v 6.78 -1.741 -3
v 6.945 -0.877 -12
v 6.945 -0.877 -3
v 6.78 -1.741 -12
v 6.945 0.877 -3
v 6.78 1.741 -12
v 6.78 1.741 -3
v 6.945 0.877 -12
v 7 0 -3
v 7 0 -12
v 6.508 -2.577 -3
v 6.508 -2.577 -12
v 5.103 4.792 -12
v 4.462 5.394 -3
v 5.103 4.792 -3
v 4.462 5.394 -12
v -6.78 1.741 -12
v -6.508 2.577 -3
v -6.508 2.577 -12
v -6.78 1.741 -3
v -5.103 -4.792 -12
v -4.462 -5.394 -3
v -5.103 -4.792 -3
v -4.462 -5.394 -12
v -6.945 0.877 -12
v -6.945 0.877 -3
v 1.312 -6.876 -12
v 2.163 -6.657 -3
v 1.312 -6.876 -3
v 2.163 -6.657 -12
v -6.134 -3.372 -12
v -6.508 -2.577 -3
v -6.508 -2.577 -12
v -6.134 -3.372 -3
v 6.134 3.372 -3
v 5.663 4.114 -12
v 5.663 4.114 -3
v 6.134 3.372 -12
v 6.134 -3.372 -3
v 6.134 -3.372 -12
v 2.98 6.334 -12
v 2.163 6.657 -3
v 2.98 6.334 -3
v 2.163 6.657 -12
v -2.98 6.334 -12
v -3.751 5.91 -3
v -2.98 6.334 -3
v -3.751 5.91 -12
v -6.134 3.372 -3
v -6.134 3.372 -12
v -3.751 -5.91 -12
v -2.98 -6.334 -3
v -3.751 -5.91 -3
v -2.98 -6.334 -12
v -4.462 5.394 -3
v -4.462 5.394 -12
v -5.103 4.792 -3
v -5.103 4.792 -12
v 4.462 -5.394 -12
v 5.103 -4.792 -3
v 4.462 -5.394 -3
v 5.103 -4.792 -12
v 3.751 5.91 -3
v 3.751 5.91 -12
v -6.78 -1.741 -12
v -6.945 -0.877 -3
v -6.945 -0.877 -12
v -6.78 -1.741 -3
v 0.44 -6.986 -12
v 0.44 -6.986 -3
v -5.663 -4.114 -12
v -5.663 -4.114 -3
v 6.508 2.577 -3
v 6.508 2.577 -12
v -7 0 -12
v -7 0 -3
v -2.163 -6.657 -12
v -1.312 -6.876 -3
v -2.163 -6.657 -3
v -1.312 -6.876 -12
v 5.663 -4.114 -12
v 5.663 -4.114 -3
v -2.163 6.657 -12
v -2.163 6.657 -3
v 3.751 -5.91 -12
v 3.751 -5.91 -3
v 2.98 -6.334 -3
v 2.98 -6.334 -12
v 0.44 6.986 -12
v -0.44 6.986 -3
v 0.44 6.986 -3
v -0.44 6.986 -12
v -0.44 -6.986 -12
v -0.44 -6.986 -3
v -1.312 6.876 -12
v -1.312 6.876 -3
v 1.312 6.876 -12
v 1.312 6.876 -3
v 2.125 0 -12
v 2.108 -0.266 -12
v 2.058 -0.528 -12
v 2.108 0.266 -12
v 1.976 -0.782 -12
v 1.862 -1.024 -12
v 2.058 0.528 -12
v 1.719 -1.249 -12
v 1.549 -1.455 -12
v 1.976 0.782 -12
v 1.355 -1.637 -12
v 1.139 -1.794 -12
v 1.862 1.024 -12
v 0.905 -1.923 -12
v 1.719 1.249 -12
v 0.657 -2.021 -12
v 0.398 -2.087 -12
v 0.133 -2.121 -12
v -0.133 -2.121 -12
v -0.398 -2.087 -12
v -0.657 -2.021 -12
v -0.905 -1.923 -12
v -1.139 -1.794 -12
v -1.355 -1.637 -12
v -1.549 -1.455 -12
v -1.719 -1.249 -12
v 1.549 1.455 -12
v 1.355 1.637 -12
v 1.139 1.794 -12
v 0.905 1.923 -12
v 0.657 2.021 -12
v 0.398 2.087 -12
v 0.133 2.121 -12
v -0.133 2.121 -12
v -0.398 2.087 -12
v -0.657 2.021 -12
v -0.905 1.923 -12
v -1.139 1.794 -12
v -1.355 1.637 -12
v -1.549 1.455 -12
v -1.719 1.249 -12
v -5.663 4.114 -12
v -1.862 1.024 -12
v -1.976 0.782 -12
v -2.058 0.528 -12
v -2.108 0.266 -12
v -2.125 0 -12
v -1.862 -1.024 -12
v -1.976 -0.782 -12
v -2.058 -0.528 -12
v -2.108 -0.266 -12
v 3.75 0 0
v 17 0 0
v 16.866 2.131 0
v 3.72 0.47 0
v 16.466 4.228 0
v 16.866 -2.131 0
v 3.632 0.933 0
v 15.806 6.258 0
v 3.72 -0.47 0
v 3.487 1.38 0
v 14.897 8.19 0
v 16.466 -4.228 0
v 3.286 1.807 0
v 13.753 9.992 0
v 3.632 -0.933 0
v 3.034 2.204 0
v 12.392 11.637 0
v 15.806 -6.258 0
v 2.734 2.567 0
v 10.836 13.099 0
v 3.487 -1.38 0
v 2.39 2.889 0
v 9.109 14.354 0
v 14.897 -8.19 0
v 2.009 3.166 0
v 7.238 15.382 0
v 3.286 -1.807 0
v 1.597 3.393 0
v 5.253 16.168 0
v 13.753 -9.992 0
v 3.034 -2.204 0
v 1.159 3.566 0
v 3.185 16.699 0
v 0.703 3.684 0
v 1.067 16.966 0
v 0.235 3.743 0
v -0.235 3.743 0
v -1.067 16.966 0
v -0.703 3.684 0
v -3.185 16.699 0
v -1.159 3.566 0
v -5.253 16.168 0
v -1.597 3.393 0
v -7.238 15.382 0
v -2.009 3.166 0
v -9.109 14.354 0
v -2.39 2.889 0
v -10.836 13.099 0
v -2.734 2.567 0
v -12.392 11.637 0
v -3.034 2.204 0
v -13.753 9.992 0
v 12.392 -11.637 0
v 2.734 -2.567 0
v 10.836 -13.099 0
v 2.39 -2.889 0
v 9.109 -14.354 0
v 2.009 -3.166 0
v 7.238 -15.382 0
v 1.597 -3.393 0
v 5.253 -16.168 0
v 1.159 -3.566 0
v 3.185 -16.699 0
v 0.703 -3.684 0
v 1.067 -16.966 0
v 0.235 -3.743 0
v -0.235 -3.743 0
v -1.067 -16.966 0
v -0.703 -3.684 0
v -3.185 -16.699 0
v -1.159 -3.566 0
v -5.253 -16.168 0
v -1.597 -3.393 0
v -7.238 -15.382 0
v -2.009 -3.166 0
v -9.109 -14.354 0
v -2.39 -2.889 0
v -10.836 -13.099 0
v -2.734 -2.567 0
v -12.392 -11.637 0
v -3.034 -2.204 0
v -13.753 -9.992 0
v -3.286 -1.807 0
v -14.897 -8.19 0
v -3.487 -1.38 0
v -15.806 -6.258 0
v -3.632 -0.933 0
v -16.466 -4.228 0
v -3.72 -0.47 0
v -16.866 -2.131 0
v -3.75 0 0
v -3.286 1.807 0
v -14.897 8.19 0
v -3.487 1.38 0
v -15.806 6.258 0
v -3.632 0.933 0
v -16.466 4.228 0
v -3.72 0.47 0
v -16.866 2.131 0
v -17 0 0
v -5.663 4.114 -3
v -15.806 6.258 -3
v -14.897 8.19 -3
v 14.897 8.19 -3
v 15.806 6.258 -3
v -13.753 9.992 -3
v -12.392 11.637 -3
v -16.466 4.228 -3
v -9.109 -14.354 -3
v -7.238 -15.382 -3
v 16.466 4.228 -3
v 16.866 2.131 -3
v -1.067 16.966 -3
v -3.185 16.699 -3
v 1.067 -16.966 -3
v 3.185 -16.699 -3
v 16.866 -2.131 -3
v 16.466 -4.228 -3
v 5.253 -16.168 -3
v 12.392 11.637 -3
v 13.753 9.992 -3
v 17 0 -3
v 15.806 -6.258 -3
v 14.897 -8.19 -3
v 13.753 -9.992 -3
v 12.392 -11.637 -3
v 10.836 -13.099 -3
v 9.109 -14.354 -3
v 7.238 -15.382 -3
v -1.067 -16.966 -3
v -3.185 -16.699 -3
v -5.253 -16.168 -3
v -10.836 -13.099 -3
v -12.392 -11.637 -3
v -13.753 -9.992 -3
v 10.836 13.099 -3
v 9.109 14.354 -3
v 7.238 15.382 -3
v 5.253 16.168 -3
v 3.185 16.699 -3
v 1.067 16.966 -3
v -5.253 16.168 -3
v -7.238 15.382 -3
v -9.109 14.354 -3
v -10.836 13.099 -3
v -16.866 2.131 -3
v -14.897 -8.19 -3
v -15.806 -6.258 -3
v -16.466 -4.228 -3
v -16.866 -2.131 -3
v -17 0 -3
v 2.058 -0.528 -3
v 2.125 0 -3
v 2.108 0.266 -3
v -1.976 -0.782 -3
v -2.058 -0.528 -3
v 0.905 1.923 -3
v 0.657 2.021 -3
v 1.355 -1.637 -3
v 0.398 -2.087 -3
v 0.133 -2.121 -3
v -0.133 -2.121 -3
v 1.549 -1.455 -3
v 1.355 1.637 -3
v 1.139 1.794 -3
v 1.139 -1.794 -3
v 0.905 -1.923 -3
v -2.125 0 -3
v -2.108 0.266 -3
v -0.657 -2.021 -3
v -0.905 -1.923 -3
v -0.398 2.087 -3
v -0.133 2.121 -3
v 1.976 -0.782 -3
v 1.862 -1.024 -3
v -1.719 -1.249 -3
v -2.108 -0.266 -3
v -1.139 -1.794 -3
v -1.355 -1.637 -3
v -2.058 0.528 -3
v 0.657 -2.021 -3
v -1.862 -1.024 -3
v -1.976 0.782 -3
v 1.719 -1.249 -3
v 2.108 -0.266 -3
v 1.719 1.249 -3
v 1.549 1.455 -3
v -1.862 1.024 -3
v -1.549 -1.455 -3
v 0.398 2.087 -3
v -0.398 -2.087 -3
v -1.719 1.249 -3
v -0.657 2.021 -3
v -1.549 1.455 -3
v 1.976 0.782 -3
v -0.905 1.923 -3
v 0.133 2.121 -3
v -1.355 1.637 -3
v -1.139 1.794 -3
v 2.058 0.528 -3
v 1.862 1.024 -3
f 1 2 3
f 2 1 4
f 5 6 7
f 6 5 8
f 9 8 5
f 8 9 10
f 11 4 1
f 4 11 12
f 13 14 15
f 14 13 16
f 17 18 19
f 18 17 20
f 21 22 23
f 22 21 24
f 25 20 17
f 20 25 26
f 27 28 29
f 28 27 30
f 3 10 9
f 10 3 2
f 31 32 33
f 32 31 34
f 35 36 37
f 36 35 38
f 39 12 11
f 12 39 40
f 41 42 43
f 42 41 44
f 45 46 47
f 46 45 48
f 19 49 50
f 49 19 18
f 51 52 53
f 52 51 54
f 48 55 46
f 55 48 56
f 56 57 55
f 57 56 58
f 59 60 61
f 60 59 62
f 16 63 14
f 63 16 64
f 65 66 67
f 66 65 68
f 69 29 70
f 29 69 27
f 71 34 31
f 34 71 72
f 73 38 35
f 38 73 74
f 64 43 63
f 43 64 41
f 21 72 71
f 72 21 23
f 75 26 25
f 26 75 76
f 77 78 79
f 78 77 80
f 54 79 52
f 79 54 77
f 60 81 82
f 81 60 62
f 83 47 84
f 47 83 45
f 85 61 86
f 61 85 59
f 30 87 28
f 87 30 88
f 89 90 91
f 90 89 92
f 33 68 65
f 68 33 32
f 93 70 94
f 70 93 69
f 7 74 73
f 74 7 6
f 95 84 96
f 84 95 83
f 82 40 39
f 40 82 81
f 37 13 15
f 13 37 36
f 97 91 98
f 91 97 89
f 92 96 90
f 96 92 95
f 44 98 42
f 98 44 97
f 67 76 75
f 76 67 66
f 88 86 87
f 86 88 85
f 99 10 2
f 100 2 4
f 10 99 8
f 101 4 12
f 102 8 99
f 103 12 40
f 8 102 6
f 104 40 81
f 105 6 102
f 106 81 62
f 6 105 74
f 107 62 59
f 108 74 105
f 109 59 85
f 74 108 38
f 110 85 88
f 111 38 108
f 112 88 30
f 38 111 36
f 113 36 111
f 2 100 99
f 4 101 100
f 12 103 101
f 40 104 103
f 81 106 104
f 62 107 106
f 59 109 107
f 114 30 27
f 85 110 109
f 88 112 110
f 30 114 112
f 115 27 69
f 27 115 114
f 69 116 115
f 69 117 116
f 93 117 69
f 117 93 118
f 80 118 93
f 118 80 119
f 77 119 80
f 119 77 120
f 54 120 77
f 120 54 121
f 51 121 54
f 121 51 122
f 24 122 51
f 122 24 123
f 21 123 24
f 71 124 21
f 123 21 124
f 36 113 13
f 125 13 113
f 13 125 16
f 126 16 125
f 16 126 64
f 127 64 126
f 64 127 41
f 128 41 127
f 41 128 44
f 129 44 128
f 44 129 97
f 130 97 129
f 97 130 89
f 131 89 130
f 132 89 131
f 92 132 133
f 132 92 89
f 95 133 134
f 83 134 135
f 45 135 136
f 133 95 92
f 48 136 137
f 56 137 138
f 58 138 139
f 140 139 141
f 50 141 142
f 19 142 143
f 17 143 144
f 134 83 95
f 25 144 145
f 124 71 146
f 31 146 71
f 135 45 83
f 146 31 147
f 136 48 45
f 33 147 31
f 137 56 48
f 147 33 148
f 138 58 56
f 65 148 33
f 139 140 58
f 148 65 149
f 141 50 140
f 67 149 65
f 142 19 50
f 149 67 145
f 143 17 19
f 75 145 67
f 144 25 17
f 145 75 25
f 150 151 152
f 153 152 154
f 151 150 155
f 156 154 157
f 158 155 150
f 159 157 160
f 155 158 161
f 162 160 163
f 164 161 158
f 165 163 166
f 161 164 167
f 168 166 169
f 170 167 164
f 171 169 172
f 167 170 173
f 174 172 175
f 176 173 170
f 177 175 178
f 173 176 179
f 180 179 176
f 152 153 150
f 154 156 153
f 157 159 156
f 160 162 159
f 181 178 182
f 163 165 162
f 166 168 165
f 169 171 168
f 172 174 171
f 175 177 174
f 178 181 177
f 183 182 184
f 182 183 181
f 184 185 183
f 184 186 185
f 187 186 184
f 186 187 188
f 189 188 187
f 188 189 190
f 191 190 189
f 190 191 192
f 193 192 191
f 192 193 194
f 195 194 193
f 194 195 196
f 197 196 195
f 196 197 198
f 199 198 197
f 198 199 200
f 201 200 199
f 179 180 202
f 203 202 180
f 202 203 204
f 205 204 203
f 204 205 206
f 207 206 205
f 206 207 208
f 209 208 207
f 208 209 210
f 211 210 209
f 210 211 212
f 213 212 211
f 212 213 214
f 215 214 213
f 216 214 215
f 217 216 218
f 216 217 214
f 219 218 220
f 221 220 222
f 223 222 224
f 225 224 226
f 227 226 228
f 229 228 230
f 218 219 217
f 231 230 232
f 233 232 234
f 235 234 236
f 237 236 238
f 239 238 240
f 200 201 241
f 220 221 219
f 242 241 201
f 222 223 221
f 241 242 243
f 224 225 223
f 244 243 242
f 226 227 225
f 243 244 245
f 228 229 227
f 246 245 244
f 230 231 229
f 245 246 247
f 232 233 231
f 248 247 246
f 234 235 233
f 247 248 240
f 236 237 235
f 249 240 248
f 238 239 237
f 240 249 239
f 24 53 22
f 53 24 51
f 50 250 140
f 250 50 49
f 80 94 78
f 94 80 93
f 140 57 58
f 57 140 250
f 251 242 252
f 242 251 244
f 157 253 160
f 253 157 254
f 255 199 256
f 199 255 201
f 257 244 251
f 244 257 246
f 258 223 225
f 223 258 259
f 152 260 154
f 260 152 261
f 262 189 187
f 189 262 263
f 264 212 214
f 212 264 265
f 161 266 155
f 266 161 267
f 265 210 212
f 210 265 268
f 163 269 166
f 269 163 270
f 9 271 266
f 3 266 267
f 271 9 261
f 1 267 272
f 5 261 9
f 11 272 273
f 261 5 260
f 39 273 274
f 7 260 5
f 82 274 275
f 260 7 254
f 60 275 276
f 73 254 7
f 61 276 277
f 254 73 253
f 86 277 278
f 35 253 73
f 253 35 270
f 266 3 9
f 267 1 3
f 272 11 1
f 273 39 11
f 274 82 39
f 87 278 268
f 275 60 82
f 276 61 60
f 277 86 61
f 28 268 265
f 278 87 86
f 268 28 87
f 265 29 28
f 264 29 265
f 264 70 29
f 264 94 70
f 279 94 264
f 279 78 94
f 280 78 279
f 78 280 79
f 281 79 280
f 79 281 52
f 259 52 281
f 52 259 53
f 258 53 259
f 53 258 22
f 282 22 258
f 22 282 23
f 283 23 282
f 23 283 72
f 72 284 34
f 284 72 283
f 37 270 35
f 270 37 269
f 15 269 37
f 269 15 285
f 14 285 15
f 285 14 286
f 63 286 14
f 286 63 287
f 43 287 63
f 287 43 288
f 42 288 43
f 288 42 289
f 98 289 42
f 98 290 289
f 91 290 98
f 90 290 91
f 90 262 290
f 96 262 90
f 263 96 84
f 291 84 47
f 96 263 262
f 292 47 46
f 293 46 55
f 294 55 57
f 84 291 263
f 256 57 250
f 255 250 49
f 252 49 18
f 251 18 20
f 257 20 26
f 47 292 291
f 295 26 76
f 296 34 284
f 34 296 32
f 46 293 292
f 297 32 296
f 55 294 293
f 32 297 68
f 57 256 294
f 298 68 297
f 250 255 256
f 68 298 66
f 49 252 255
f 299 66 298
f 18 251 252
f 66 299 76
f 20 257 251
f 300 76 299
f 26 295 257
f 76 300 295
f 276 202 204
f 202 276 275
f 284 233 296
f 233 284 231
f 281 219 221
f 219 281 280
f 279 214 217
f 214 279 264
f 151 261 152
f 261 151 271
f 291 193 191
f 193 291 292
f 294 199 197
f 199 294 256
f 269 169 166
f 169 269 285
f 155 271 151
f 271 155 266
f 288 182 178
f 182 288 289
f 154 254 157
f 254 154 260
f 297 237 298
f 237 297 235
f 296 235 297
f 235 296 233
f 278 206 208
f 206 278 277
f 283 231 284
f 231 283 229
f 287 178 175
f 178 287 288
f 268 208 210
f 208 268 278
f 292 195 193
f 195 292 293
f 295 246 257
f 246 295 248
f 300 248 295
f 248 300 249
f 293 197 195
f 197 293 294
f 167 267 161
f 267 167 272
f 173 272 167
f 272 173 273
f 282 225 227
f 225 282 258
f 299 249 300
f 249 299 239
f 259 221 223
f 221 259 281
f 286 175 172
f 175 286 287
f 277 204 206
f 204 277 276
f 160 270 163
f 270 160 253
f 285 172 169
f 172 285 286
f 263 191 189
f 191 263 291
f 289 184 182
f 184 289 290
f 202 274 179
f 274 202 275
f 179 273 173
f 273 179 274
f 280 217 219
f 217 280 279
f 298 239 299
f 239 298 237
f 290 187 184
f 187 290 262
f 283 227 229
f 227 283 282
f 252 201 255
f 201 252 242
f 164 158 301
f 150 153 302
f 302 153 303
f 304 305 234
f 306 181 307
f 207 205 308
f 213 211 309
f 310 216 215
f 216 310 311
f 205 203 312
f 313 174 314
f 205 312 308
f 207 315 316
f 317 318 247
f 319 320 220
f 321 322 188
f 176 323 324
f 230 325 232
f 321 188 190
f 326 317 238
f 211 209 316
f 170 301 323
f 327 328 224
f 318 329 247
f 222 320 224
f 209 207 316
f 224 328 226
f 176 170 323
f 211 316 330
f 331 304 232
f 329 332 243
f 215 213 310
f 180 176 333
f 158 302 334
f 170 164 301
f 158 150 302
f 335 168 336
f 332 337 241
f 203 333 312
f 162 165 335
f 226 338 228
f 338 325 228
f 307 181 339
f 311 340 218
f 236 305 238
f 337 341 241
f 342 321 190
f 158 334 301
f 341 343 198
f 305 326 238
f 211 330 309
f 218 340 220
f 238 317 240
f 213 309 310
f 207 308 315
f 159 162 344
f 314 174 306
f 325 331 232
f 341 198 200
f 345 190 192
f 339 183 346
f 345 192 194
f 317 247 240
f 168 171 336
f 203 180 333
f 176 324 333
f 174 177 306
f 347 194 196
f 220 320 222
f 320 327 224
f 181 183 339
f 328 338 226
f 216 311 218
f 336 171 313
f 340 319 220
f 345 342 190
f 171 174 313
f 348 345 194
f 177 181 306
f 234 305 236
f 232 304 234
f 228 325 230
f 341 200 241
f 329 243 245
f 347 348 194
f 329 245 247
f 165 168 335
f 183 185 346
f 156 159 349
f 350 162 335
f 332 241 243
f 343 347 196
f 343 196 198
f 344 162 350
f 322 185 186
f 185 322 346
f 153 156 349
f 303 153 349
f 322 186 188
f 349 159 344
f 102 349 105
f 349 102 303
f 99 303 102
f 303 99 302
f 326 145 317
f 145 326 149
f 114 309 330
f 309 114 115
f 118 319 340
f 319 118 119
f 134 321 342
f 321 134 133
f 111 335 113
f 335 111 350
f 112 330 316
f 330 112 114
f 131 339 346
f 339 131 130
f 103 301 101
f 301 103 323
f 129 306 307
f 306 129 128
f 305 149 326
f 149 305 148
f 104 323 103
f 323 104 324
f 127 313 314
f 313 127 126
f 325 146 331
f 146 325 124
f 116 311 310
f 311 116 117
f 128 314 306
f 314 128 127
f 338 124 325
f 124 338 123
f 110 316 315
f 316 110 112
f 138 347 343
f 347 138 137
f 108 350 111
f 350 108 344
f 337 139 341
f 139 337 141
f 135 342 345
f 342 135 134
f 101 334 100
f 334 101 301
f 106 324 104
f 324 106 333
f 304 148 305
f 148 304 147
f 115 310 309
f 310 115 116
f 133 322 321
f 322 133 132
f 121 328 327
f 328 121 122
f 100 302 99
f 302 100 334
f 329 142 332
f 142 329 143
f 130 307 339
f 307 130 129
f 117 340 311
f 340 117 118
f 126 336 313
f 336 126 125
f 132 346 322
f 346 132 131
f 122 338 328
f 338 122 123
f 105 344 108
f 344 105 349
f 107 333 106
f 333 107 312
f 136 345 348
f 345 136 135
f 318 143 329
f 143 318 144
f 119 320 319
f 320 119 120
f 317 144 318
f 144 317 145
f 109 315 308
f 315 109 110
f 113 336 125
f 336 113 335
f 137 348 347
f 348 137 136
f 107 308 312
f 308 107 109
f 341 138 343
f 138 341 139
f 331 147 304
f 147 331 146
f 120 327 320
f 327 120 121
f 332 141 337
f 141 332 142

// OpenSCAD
$fn = 50;


difference() {
	union() {
		translate(v = [0, 0, -12.0000000000]) {
			cylinder(h = 12, r = 7.0000000000);
		}
		translate(v = [0, 0, -3.0000000000]) {
			cylinder(h = 3, r = 17.0000000000);
		}
	}
	union() {
		translate(v = [0, 0, 0]) {
			rotate(a = [0, 0, 0]) {
				difference() {
					union() {
						#translate(v = [0, 0, -12.0000000000]) {
							cylinder(h = 12, r = 2.0000000000);
						}
						#translate(v = [0, 0, -3]) {
							cylinder(h = 3, r = 7.0000000000, r1 = 2.1250000000, r2 = 3.7500000000);
						}
						#translate(v = [0, 0, -12.0000000000]) {
							cylinder(h = 12, r = 2.1250000000);
						}
						#translate(v = [0, 0, -12.0000000000]) {
							cylinder(h = 12, r = 2.0000000000);
						}
					}
					union();
				}
			}
		}
	}
}
